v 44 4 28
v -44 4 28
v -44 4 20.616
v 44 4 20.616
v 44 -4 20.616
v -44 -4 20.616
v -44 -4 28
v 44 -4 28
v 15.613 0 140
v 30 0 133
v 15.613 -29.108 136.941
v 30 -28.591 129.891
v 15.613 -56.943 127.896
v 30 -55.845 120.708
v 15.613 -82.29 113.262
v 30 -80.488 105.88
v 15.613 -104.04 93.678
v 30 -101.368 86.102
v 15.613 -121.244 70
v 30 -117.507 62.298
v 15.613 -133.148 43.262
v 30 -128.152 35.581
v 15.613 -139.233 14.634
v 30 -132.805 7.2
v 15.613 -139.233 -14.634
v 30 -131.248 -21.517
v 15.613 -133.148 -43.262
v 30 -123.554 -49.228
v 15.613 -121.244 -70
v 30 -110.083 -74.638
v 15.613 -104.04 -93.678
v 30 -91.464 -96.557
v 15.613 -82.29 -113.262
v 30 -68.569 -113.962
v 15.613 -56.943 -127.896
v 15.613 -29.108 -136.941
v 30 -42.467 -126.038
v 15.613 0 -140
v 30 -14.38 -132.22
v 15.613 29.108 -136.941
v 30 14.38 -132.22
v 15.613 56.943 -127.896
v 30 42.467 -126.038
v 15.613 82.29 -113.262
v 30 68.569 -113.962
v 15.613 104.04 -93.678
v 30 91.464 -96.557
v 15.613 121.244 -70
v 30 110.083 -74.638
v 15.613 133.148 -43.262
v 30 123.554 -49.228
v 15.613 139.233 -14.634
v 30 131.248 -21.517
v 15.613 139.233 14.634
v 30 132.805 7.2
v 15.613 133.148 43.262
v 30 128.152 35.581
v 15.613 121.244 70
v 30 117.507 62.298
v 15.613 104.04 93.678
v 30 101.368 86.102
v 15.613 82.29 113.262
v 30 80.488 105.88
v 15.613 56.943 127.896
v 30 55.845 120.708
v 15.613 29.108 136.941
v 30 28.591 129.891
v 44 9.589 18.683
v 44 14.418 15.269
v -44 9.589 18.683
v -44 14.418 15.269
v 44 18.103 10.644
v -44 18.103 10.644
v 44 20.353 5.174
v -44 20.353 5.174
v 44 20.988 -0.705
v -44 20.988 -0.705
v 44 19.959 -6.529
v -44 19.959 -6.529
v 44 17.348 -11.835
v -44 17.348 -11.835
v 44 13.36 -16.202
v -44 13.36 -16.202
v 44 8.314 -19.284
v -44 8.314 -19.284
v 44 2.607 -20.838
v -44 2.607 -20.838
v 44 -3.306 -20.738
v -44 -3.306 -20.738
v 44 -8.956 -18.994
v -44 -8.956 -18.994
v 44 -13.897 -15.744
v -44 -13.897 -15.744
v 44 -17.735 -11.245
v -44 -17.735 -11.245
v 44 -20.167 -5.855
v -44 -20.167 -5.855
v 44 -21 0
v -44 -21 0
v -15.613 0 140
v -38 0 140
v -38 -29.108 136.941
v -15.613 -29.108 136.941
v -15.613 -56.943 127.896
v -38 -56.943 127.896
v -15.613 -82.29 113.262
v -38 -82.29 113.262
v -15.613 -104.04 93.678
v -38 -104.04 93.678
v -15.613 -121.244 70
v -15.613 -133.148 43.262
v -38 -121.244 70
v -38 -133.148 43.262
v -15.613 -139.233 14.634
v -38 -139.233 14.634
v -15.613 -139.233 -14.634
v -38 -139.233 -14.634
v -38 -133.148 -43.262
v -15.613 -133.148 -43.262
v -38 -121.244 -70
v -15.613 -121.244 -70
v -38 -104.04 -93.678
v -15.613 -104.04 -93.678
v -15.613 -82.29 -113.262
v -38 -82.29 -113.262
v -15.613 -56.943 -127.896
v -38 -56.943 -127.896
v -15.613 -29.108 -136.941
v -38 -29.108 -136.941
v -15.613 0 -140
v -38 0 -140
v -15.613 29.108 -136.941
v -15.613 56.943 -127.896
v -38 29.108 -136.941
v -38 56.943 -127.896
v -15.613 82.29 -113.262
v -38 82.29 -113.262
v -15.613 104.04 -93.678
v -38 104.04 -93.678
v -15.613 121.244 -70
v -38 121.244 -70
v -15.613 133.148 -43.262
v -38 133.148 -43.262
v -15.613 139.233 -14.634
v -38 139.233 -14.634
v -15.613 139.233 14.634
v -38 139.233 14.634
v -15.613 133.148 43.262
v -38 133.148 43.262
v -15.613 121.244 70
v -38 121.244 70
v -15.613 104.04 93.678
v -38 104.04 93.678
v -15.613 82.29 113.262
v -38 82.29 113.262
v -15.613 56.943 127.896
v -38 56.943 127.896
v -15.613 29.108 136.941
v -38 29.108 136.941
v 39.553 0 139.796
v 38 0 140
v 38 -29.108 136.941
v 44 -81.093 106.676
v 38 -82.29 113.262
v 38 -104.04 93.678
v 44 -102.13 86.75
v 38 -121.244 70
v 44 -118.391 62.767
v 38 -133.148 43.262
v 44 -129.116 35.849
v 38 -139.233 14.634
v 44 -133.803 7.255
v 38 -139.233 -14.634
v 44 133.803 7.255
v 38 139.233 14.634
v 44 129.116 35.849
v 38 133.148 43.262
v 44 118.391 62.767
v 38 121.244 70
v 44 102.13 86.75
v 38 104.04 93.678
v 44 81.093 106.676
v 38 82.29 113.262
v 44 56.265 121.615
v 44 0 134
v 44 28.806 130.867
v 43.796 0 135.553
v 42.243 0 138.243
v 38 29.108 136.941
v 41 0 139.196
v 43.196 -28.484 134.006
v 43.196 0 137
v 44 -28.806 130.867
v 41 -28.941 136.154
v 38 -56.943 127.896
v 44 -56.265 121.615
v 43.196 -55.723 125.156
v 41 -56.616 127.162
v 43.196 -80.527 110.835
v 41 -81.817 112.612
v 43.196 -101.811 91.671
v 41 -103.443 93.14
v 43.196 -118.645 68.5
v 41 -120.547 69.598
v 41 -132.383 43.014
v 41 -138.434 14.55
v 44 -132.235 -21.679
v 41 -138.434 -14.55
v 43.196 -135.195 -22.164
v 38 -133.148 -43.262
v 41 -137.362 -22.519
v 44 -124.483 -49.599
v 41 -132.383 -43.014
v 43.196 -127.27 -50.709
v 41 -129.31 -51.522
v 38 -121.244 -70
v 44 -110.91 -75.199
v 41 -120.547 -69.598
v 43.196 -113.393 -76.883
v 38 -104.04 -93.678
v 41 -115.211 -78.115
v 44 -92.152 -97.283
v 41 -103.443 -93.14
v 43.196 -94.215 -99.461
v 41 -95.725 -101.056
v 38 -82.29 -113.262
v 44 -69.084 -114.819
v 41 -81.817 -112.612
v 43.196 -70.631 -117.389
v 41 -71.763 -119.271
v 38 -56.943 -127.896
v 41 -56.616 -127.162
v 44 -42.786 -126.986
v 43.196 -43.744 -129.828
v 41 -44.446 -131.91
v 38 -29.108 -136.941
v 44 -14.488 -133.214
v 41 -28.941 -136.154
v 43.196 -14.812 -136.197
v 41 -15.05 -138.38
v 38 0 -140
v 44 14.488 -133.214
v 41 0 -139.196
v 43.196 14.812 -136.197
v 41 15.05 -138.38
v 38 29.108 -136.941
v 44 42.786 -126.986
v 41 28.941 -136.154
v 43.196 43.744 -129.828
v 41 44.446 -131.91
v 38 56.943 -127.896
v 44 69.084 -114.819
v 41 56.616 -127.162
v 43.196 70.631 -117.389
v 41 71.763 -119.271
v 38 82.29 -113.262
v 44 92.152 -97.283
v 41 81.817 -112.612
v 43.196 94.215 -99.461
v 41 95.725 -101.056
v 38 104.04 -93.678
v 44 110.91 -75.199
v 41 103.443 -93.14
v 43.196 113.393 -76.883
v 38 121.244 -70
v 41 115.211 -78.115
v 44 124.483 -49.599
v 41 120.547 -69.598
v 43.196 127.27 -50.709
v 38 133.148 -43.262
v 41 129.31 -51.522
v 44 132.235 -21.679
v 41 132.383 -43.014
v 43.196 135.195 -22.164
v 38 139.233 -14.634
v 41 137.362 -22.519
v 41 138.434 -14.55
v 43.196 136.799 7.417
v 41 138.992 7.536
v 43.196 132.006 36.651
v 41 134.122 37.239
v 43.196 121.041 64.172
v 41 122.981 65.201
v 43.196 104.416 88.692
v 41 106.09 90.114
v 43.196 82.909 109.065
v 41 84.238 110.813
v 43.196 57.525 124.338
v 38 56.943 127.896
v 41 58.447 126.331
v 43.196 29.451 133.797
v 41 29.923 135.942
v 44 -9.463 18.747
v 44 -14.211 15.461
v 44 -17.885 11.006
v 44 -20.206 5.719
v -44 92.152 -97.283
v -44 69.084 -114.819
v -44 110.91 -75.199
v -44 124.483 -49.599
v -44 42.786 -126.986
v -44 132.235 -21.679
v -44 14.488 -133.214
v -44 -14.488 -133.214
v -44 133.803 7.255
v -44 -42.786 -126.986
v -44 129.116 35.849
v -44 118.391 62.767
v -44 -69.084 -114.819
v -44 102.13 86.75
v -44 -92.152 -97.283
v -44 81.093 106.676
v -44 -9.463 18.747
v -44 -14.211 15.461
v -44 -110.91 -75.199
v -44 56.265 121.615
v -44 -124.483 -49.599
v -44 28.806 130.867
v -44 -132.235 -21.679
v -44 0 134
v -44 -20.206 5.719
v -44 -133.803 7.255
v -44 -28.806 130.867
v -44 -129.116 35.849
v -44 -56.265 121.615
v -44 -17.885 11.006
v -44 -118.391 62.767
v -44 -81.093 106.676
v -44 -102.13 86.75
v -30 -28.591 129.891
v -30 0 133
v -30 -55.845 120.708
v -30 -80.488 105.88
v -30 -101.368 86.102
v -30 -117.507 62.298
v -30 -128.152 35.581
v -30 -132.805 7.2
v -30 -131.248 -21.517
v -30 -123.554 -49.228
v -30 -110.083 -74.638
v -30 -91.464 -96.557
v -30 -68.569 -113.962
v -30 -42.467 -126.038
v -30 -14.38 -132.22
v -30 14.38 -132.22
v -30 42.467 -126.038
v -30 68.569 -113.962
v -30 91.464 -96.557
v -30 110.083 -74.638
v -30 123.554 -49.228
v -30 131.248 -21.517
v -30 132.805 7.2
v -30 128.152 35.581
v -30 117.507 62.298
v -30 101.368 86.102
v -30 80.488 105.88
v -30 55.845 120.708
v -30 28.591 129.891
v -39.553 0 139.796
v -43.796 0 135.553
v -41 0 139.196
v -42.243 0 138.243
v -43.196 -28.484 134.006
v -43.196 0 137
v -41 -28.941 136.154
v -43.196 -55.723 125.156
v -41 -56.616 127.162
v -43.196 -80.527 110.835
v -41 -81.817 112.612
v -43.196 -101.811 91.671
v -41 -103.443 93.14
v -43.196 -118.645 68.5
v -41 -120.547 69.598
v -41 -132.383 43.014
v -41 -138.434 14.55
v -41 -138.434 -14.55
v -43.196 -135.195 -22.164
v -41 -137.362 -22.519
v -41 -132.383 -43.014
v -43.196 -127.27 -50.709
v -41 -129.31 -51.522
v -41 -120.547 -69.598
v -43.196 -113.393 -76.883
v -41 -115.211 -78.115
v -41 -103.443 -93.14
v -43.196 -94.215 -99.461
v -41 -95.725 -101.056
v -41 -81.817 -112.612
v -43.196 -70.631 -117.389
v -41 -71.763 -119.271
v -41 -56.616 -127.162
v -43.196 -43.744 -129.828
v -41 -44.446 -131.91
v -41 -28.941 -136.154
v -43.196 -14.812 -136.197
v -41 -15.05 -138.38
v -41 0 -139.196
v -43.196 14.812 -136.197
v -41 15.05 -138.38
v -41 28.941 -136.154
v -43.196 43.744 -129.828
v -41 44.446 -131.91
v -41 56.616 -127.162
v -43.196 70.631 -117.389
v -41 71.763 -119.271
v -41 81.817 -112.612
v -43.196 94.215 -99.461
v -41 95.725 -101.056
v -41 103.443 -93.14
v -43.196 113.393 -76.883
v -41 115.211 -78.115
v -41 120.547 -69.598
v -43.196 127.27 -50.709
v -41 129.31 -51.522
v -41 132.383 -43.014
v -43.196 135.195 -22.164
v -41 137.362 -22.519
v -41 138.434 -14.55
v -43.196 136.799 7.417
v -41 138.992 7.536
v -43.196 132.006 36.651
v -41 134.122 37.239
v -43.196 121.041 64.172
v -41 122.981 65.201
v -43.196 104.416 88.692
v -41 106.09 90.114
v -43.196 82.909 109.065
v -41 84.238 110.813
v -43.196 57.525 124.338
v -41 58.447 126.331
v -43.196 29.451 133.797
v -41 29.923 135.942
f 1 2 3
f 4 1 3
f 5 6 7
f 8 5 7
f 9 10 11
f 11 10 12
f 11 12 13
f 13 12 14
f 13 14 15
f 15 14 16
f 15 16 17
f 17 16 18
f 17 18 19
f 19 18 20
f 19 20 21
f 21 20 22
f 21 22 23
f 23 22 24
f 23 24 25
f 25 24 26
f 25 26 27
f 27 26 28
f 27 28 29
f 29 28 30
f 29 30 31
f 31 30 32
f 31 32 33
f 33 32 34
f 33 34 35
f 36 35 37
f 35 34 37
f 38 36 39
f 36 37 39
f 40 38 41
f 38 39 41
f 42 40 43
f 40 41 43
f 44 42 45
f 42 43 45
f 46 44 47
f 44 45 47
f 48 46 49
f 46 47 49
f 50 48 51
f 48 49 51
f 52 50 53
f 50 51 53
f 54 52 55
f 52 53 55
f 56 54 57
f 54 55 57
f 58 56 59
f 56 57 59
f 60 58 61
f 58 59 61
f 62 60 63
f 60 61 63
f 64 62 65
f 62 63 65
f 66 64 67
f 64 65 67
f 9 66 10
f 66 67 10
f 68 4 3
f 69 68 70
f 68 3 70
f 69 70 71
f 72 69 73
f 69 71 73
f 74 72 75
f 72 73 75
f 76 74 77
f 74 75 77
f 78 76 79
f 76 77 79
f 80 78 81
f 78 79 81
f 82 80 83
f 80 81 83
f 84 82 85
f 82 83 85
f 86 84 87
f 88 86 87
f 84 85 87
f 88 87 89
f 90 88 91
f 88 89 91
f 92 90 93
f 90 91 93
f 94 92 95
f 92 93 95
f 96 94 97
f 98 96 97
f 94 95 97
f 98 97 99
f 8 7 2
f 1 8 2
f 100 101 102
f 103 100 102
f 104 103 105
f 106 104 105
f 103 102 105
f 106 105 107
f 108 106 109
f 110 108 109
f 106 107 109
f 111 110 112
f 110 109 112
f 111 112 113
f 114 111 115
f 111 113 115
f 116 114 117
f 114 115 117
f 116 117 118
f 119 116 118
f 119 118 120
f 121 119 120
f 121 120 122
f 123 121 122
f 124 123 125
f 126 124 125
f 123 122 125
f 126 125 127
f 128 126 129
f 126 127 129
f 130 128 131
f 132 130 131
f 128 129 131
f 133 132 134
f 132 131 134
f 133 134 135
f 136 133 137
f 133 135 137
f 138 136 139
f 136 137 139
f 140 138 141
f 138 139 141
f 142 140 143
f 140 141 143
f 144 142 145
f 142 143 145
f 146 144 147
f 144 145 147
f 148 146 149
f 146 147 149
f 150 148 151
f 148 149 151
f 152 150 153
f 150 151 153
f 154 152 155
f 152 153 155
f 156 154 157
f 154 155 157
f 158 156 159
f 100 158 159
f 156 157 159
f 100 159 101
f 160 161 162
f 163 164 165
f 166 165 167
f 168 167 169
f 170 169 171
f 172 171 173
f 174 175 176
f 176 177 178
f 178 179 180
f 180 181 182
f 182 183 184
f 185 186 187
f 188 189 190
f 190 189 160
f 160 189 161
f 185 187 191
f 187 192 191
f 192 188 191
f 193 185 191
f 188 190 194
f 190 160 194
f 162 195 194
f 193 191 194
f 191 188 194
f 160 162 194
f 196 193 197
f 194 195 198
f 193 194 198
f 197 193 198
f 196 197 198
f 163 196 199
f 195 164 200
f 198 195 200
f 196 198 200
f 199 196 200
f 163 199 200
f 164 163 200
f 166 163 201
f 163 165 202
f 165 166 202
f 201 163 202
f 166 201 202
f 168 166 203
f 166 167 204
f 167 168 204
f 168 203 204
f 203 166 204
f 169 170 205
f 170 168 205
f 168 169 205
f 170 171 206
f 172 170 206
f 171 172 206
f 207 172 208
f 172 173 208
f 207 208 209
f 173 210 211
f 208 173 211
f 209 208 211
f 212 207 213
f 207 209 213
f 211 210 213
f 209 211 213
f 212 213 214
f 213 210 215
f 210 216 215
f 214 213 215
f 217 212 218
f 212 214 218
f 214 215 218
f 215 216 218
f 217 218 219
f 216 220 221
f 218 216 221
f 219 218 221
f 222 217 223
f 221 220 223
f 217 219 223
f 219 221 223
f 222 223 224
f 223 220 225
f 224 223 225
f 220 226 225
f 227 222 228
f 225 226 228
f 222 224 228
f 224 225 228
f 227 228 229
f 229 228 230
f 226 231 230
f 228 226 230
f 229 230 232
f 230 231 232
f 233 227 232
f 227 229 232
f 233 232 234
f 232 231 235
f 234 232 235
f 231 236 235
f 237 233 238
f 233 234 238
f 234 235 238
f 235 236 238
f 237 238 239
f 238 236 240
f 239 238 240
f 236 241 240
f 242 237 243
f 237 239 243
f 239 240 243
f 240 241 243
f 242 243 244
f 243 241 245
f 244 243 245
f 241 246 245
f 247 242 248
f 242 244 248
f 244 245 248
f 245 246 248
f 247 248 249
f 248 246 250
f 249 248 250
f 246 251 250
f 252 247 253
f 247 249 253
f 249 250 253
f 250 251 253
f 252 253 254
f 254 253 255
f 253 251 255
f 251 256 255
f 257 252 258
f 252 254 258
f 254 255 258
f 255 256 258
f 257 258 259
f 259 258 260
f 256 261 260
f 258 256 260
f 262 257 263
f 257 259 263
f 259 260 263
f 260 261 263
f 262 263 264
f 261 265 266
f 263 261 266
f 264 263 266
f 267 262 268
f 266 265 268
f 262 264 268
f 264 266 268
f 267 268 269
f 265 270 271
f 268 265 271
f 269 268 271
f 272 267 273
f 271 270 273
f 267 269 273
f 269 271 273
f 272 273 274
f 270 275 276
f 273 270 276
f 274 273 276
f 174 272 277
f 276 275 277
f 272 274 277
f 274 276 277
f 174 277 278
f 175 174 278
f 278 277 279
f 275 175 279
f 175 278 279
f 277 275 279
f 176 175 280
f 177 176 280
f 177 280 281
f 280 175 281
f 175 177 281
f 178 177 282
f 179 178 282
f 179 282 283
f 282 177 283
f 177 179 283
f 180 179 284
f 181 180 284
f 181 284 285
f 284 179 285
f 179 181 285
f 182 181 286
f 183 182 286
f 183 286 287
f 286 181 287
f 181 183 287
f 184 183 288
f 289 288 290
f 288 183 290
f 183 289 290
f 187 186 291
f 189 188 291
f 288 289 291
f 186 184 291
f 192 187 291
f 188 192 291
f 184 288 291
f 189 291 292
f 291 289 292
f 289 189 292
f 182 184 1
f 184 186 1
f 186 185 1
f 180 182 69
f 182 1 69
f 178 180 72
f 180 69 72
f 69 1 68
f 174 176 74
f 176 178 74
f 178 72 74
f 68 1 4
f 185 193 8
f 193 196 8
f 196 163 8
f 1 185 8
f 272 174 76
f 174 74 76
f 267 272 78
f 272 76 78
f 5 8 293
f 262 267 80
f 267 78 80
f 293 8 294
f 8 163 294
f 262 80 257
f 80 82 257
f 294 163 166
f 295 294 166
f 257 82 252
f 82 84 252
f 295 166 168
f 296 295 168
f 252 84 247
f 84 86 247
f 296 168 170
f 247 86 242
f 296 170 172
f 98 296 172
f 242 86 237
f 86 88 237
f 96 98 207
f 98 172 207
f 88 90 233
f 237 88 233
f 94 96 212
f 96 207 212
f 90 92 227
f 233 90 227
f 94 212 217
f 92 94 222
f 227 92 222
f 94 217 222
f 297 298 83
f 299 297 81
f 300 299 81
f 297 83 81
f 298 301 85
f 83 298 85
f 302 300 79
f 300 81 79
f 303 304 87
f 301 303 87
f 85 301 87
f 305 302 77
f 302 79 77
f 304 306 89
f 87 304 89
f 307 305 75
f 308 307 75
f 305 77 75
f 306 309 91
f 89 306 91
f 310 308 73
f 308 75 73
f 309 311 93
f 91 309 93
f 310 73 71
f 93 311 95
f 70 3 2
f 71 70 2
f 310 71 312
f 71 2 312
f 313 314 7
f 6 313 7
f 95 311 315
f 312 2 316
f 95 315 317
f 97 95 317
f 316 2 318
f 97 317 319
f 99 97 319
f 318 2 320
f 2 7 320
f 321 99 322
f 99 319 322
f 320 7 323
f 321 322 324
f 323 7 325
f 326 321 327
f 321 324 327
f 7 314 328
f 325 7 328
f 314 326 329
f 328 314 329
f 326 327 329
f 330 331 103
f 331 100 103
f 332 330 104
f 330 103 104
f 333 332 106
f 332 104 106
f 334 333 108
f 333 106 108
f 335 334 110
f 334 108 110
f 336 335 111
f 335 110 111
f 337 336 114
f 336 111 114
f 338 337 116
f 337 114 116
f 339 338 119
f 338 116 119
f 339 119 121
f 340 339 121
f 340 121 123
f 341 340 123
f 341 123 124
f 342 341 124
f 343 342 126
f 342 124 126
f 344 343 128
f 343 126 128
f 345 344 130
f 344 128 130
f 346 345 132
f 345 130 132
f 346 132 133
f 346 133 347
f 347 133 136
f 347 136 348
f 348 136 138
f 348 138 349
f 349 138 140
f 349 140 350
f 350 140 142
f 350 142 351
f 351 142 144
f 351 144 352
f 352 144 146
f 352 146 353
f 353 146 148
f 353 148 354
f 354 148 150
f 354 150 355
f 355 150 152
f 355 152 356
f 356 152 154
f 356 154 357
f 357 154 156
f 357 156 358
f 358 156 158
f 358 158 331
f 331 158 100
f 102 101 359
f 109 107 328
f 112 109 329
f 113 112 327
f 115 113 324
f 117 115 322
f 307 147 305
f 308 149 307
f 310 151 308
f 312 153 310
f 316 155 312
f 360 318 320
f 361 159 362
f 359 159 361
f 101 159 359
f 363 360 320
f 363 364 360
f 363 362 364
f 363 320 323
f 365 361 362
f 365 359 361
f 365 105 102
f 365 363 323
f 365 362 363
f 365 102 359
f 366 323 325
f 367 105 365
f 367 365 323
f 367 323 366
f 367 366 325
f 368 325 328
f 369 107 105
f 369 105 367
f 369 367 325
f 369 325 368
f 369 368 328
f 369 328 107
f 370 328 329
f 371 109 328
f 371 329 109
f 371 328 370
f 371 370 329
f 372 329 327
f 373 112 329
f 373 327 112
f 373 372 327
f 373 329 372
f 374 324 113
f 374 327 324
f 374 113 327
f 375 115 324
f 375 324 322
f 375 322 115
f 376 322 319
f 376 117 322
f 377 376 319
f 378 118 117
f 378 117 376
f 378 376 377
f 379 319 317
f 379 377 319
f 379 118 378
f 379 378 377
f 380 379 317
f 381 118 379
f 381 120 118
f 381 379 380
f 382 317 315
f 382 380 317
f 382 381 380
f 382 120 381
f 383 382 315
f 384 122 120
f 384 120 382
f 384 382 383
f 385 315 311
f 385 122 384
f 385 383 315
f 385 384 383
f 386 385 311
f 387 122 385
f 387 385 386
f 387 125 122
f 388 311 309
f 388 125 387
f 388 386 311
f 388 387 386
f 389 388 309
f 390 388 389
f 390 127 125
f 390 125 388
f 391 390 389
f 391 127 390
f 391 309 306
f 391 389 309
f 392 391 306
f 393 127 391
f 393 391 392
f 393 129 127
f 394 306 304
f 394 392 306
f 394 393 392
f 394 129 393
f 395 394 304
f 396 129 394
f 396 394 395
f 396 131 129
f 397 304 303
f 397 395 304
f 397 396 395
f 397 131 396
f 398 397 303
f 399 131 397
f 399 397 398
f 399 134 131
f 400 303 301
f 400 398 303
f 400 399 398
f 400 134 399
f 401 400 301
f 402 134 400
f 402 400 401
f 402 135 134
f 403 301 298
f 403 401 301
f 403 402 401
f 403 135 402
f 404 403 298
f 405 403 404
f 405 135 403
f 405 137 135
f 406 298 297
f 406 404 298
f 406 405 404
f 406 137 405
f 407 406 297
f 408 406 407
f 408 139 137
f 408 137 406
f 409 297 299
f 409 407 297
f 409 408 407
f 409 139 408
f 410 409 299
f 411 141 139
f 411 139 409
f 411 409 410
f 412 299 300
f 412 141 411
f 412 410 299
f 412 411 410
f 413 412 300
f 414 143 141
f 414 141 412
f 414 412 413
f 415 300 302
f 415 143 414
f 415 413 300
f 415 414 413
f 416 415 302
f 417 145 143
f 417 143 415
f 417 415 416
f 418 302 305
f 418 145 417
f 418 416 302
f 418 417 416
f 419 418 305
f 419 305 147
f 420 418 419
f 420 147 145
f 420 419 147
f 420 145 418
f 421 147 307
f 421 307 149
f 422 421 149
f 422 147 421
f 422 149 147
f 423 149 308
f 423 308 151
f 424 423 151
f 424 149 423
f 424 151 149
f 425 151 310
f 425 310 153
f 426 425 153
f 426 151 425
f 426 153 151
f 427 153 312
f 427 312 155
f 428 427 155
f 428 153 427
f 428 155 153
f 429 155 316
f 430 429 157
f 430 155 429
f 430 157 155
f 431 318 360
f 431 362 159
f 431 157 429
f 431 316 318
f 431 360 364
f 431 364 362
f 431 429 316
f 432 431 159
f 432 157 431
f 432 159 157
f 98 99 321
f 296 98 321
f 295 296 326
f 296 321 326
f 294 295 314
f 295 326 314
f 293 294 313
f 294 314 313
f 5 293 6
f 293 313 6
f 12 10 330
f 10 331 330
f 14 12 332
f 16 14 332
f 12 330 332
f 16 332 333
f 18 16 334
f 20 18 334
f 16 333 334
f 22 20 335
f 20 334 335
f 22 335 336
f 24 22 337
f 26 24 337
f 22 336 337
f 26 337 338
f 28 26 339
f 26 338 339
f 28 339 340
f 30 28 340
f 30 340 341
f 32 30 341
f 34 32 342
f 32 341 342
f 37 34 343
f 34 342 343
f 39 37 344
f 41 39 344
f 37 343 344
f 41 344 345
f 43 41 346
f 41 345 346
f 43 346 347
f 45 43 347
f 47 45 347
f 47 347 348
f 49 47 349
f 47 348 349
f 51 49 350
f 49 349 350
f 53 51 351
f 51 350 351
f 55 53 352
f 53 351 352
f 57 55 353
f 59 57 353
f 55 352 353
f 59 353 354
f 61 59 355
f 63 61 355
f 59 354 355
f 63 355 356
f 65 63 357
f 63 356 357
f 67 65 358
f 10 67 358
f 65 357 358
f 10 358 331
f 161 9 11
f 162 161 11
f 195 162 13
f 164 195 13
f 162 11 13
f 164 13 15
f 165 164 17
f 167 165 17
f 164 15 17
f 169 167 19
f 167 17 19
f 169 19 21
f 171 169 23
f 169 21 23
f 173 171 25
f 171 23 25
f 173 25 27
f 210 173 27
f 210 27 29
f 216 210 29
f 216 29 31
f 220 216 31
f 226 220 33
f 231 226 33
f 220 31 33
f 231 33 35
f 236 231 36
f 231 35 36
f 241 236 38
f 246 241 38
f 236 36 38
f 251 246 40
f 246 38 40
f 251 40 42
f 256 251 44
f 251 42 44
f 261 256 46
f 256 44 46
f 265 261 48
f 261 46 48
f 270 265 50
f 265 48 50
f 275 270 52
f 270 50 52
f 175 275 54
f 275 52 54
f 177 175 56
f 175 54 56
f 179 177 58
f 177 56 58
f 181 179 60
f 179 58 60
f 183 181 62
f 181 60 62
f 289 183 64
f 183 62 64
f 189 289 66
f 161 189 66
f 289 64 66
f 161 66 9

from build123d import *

# Parameters (mm, degrees)
F2_R     = 6
F4_DEPTH = 88


with BuildPart() as f1:
    # F0 (on Front) → F1 (revolve)
    with BuildSketch(Plane.XZ):
        Polygon((-44, 140), (-44, 0), (44, 0), (44, 140), (15.6125054301, 140), (30, 133), (-30, 133), (-15.6125054301, 140), align=None)
    revolve(axis=Axis((0, 0, 0), (1, 0, 0)))

    # F2
    f2_edges = [f1.edges().sort_by_distance(p)[0] for p in [
        (-44, 0, -140),
        (44, 0, -140),
    ]]
    fillet(f2_edges, radius=F2_R)

    # F3 (on face) → F4 (cut)
    with BuildSketch(Plane(origin=(-44, 0, 0), x_dir=(0, -1, 0), z_dir=(-1, 0, 0))):
        with BuildLine():
            ThreePointArc((-4, 20.6155281281), (-13.3603892159, -16.201851746), (21, 0))
            ThreePointArc((21, 0), (16.201851746, 13.3603892159), (4, 20.6155281281))
            Line((4, 20.6155281281), (4, 16))
            Line((4, 16), (-4, 16))
            Line((-4, 16), (-4, 20.6155281281))
        make_face()
        with BuildLine():
            Line((4, 16), (4, 20.6155281281))
            ThreePointArc((4, 20.6155281281), (0, 21), (-4, 20.6155281281))
            Line((-4, 20.6155281281), (-4, 16))
            Line((-4, 16), (4, 16))
        make_face()
        with BuildLine():
            ThreePointArc((-4, 20.6155281281), (0, 21), (4, 20.6155281281))
            Line((4, 20.6155281281), (4, 28))
            Line((4, 28), (-4, 28))
            Line((-4, 28), (-4, 20.6155281281))
        make_face()
    extrude(amount=-F4_DEPTH, mode=Mode.SUBTRACT)


solid = f1.part
